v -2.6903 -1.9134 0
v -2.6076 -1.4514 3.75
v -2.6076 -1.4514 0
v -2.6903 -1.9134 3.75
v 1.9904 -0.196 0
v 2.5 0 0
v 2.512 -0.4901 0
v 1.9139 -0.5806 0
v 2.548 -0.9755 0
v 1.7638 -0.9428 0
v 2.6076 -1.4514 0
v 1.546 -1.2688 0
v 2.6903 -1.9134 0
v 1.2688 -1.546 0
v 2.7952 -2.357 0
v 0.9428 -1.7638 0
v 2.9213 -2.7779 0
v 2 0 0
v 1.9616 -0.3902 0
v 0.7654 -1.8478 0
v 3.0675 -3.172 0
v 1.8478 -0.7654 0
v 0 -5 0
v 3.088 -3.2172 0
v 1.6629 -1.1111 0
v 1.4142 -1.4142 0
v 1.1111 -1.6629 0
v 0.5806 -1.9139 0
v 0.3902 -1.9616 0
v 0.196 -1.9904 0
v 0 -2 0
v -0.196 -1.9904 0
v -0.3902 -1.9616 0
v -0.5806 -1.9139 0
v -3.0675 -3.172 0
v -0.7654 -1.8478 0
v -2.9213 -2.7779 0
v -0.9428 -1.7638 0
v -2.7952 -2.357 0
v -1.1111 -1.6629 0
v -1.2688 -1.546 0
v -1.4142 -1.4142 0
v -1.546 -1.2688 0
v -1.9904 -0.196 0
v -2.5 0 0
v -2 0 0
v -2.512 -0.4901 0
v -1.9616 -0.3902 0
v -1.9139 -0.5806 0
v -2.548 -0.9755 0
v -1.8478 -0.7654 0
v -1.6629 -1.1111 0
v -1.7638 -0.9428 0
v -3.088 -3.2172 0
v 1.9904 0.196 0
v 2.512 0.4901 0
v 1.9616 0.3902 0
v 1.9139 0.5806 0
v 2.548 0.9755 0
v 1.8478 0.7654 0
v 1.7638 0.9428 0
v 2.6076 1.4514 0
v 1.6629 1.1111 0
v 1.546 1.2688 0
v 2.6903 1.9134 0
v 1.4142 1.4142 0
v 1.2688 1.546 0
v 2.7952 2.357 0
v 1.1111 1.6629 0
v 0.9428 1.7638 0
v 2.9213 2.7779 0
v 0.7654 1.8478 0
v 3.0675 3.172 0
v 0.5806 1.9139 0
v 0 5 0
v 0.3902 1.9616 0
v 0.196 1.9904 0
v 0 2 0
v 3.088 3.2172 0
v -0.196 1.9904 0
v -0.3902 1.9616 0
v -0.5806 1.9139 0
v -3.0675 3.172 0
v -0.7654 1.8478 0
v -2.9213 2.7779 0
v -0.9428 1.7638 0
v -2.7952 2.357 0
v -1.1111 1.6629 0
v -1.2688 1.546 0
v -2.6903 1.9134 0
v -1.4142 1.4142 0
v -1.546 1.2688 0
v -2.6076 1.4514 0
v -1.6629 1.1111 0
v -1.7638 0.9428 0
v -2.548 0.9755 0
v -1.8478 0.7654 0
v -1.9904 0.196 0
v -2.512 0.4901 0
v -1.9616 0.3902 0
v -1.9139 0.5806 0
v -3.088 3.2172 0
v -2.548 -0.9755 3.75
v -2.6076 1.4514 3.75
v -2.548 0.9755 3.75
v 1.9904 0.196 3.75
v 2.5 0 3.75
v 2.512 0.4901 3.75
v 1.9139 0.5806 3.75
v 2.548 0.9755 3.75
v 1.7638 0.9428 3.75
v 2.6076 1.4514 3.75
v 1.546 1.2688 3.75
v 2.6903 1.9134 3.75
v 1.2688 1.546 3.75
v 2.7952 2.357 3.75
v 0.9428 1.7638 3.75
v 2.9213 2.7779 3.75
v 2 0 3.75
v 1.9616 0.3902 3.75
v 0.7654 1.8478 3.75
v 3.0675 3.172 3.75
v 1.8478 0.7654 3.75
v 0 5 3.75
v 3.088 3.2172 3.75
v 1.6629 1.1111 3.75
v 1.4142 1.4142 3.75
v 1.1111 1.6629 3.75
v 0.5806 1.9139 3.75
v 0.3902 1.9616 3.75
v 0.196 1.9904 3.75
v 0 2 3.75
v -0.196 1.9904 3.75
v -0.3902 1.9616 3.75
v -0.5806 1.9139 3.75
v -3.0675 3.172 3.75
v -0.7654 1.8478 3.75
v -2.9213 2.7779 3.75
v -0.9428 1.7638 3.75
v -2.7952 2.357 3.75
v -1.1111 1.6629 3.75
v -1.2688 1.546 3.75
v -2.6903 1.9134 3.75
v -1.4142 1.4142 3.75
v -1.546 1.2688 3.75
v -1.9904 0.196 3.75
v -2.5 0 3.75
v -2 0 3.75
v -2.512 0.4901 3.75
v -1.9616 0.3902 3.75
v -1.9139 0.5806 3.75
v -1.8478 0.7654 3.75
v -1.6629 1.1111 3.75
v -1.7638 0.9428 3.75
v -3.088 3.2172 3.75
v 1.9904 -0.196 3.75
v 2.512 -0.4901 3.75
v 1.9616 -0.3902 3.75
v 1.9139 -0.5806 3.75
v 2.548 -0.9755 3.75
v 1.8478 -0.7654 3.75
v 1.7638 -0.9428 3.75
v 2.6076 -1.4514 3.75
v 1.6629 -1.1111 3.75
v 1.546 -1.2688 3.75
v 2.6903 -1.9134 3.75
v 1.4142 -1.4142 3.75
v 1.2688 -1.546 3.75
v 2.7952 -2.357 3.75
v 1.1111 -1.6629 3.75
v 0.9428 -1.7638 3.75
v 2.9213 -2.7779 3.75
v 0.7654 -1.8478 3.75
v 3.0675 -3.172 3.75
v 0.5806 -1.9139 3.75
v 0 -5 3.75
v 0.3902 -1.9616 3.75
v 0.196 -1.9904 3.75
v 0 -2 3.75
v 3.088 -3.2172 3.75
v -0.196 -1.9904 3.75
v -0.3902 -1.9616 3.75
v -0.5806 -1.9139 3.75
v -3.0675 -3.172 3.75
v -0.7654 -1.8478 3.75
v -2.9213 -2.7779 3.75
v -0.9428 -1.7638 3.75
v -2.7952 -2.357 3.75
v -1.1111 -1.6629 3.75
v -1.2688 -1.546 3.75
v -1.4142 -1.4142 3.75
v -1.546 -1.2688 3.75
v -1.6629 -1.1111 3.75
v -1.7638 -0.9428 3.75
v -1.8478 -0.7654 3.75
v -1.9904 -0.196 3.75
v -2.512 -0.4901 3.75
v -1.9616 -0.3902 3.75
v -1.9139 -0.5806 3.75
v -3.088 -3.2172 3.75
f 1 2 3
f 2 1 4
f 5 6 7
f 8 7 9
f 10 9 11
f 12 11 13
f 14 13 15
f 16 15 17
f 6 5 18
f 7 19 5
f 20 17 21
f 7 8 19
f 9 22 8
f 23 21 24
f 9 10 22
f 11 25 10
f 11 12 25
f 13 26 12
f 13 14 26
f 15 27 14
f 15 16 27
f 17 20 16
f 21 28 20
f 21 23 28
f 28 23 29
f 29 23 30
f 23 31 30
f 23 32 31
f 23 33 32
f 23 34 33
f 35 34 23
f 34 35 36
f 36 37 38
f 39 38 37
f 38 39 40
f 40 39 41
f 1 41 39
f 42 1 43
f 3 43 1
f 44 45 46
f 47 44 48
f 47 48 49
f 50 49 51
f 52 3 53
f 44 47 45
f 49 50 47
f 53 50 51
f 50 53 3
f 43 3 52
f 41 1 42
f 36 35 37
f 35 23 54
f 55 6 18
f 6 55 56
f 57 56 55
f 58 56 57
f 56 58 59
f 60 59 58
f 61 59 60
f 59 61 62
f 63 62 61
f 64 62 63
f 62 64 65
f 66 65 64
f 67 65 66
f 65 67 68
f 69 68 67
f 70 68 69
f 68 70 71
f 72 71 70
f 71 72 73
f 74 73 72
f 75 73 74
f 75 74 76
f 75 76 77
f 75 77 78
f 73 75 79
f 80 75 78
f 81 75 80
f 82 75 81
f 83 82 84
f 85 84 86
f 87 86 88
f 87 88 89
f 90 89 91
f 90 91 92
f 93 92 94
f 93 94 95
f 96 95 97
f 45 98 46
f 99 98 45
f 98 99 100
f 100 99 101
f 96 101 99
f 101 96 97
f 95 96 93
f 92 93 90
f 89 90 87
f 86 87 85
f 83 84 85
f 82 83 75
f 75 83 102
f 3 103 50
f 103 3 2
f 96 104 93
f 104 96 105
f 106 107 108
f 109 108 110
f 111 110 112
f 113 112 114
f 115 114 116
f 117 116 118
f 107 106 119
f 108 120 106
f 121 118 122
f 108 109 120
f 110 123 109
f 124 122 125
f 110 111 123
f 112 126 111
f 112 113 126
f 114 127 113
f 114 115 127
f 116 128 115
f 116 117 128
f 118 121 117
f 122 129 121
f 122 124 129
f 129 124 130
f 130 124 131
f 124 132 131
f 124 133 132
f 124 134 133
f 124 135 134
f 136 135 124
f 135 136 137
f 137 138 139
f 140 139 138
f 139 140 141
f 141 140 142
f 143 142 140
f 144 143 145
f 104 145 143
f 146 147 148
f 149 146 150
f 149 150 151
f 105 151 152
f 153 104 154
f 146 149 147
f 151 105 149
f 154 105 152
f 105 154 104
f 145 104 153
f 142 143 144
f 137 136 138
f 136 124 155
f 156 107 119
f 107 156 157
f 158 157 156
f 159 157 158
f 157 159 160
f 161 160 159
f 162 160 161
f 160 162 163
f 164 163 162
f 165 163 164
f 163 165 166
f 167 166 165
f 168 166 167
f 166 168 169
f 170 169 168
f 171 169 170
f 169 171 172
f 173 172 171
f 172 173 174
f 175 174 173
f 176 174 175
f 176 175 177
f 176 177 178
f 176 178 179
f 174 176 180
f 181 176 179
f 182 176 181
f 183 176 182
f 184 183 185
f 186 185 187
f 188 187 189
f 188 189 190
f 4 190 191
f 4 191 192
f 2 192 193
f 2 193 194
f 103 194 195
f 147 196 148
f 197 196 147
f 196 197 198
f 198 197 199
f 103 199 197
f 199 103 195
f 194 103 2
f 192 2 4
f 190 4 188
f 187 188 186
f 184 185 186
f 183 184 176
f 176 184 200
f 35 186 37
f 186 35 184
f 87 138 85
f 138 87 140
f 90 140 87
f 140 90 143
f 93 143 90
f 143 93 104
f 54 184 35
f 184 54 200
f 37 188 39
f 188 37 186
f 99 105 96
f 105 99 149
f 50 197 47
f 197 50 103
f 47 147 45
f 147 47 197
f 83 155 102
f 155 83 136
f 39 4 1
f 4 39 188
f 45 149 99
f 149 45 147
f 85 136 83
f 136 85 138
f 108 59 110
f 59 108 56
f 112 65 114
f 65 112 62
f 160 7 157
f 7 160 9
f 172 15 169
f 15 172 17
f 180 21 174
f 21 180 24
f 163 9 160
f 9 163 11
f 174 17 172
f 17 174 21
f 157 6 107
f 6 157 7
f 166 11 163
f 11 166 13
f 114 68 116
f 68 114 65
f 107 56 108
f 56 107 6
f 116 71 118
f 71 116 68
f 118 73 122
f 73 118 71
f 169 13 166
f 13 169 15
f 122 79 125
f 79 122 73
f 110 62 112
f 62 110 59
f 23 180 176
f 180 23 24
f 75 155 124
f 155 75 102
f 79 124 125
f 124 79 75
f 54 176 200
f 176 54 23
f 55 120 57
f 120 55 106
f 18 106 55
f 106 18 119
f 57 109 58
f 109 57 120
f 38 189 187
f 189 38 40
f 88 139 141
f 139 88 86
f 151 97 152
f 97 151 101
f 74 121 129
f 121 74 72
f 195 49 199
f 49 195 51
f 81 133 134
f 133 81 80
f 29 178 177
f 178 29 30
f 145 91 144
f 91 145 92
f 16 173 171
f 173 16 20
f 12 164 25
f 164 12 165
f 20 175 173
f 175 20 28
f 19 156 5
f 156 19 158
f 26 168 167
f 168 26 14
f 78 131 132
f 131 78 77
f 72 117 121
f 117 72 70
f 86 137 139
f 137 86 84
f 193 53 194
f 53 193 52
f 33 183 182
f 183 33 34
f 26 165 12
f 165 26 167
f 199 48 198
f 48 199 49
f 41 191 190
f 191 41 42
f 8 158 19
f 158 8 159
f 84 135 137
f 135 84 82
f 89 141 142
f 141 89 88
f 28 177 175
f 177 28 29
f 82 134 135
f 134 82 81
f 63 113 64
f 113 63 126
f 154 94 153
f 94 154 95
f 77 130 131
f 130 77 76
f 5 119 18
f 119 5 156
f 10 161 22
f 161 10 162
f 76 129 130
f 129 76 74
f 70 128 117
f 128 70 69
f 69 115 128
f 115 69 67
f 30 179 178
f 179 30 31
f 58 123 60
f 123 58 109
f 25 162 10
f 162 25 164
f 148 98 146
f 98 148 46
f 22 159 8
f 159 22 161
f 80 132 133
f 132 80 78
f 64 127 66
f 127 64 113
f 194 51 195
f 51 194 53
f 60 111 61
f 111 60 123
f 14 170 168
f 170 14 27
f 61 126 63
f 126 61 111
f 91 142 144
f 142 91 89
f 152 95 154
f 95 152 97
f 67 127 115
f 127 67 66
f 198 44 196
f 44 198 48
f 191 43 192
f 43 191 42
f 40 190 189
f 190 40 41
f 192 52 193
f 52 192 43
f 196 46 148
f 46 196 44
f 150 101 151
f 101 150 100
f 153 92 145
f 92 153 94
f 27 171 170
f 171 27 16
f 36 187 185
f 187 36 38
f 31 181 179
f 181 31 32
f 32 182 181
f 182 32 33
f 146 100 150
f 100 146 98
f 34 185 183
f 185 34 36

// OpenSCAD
module wing_nut() {
    difference() {
        // Main hexagonal body
        scale([1, 1, 0.375])
            rotate([0, 0, 30])
                cylinder(d=10, h=10, $fn=6);
        
        // Hole for the screw
        translate([0, 0, -5])
            cylinder(d=4, h=20, $fn=64);
        
        // Wings
        union() {
            translate([-5, 0, 0])
                rotate([0, 0, 90])
                    scale([1, 0.5, 1])
                        cylinder(d=10, h=3.75, $fn=64);
            translate([5, 0, 0])
                rotate([0, 0, 90])
                    scale([1, 0.5, 1])
                        cylinder(d=10, h=3.75, $fn=64);
        }
    }
}

wing_nut();
